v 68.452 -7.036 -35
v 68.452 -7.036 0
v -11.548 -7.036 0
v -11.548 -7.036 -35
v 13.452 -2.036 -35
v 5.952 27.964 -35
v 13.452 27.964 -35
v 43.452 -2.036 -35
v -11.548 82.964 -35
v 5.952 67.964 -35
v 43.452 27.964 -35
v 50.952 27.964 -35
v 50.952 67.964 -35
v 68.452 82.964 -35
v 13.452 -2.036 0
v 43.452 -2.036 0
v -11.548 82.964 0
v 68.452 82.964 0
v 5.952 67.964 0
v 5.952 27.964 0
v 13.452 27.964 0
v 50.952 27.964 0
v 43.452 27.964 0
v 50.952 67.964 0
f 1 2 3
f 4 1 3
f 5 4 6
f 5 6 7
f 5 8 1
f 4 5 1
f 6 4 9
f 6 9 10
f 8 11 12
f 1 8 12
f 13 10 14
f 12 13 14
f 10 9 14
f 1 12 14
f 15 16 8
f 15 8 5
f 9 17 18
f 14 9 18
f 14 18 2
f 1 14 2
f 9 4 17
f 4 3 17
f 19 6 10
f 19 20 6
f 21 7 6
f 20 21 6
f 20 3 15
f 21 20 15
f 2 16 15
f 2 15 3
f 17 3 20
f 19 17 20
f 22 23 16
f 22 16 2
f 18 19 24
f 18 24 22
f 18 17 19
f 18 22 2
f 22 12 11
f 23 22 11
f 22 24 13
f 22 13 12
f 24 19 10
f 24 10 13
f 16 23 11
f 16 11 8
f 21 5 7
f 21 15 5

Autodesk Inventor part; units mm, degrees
ref_plane "YZ Plane" through (0, 0, 0) normal (1, 0, 0) x (0, 1, 0)
ref_plane "XZ Plane" through (0, 0, 0) normal (0, 1, 0) x (-1, 0, 0)
ref_plane "XY Plane" through (0, 0, 0) normal (0, 0, 1) x (1, 0, 0)
sketch "Sketch1" plane through (0, 0, 0) normal (0, 0, 1) x (1, 0, 0)
  line L0 (-11.5482, -7.036) -> (-11.5482, 82.964)
  line L1 (-11.5482, 82.964) -> (68.4518, 82.964)
  line L2 (68.4518, 82.964) -> (68.4518, -7.036)
  line L3 (68.4518, -7.036) -> (-11.5482, -7.036)
  line L4 (5.9518, 27.964) -> (5.9518, 67.964)
  line L5 (5.9518, 67.964) -> (50.9518, 67.964)
  line L6 (50.9518, 67.964) -> (50.9518, 27.964)
  line L7 (50.9518, 27.964) -> (43.4518, 27.964)
  line L8 (43.4518, 27.964) -> (43.4518, -2.036)
  line L9 (43.4518, -2.036) -> (13.4518, -2.036)
  line L10 (13.4518, -2.036) -> (13.4518, 27.964)
  line L11 (13.4518, 27.964) -> (5.9518, 27.964)
  point P0 (0, 0)
  dimension "d0" = 90
  dimension "d1" = 80
  dimension "d2" = 90
  dimension "d3" = 45
  dimension "d4" = 40
  dimension "d5" = 7.5
  dimension "d6" = 30
  dimension "d7" = 17.5
  dimension "d8" = 15
  dimension "d9" = 30
extrude "Extrusion1" add sketch "Sketch1" against normal blind 35
properties part number "BT002_Matrize"
